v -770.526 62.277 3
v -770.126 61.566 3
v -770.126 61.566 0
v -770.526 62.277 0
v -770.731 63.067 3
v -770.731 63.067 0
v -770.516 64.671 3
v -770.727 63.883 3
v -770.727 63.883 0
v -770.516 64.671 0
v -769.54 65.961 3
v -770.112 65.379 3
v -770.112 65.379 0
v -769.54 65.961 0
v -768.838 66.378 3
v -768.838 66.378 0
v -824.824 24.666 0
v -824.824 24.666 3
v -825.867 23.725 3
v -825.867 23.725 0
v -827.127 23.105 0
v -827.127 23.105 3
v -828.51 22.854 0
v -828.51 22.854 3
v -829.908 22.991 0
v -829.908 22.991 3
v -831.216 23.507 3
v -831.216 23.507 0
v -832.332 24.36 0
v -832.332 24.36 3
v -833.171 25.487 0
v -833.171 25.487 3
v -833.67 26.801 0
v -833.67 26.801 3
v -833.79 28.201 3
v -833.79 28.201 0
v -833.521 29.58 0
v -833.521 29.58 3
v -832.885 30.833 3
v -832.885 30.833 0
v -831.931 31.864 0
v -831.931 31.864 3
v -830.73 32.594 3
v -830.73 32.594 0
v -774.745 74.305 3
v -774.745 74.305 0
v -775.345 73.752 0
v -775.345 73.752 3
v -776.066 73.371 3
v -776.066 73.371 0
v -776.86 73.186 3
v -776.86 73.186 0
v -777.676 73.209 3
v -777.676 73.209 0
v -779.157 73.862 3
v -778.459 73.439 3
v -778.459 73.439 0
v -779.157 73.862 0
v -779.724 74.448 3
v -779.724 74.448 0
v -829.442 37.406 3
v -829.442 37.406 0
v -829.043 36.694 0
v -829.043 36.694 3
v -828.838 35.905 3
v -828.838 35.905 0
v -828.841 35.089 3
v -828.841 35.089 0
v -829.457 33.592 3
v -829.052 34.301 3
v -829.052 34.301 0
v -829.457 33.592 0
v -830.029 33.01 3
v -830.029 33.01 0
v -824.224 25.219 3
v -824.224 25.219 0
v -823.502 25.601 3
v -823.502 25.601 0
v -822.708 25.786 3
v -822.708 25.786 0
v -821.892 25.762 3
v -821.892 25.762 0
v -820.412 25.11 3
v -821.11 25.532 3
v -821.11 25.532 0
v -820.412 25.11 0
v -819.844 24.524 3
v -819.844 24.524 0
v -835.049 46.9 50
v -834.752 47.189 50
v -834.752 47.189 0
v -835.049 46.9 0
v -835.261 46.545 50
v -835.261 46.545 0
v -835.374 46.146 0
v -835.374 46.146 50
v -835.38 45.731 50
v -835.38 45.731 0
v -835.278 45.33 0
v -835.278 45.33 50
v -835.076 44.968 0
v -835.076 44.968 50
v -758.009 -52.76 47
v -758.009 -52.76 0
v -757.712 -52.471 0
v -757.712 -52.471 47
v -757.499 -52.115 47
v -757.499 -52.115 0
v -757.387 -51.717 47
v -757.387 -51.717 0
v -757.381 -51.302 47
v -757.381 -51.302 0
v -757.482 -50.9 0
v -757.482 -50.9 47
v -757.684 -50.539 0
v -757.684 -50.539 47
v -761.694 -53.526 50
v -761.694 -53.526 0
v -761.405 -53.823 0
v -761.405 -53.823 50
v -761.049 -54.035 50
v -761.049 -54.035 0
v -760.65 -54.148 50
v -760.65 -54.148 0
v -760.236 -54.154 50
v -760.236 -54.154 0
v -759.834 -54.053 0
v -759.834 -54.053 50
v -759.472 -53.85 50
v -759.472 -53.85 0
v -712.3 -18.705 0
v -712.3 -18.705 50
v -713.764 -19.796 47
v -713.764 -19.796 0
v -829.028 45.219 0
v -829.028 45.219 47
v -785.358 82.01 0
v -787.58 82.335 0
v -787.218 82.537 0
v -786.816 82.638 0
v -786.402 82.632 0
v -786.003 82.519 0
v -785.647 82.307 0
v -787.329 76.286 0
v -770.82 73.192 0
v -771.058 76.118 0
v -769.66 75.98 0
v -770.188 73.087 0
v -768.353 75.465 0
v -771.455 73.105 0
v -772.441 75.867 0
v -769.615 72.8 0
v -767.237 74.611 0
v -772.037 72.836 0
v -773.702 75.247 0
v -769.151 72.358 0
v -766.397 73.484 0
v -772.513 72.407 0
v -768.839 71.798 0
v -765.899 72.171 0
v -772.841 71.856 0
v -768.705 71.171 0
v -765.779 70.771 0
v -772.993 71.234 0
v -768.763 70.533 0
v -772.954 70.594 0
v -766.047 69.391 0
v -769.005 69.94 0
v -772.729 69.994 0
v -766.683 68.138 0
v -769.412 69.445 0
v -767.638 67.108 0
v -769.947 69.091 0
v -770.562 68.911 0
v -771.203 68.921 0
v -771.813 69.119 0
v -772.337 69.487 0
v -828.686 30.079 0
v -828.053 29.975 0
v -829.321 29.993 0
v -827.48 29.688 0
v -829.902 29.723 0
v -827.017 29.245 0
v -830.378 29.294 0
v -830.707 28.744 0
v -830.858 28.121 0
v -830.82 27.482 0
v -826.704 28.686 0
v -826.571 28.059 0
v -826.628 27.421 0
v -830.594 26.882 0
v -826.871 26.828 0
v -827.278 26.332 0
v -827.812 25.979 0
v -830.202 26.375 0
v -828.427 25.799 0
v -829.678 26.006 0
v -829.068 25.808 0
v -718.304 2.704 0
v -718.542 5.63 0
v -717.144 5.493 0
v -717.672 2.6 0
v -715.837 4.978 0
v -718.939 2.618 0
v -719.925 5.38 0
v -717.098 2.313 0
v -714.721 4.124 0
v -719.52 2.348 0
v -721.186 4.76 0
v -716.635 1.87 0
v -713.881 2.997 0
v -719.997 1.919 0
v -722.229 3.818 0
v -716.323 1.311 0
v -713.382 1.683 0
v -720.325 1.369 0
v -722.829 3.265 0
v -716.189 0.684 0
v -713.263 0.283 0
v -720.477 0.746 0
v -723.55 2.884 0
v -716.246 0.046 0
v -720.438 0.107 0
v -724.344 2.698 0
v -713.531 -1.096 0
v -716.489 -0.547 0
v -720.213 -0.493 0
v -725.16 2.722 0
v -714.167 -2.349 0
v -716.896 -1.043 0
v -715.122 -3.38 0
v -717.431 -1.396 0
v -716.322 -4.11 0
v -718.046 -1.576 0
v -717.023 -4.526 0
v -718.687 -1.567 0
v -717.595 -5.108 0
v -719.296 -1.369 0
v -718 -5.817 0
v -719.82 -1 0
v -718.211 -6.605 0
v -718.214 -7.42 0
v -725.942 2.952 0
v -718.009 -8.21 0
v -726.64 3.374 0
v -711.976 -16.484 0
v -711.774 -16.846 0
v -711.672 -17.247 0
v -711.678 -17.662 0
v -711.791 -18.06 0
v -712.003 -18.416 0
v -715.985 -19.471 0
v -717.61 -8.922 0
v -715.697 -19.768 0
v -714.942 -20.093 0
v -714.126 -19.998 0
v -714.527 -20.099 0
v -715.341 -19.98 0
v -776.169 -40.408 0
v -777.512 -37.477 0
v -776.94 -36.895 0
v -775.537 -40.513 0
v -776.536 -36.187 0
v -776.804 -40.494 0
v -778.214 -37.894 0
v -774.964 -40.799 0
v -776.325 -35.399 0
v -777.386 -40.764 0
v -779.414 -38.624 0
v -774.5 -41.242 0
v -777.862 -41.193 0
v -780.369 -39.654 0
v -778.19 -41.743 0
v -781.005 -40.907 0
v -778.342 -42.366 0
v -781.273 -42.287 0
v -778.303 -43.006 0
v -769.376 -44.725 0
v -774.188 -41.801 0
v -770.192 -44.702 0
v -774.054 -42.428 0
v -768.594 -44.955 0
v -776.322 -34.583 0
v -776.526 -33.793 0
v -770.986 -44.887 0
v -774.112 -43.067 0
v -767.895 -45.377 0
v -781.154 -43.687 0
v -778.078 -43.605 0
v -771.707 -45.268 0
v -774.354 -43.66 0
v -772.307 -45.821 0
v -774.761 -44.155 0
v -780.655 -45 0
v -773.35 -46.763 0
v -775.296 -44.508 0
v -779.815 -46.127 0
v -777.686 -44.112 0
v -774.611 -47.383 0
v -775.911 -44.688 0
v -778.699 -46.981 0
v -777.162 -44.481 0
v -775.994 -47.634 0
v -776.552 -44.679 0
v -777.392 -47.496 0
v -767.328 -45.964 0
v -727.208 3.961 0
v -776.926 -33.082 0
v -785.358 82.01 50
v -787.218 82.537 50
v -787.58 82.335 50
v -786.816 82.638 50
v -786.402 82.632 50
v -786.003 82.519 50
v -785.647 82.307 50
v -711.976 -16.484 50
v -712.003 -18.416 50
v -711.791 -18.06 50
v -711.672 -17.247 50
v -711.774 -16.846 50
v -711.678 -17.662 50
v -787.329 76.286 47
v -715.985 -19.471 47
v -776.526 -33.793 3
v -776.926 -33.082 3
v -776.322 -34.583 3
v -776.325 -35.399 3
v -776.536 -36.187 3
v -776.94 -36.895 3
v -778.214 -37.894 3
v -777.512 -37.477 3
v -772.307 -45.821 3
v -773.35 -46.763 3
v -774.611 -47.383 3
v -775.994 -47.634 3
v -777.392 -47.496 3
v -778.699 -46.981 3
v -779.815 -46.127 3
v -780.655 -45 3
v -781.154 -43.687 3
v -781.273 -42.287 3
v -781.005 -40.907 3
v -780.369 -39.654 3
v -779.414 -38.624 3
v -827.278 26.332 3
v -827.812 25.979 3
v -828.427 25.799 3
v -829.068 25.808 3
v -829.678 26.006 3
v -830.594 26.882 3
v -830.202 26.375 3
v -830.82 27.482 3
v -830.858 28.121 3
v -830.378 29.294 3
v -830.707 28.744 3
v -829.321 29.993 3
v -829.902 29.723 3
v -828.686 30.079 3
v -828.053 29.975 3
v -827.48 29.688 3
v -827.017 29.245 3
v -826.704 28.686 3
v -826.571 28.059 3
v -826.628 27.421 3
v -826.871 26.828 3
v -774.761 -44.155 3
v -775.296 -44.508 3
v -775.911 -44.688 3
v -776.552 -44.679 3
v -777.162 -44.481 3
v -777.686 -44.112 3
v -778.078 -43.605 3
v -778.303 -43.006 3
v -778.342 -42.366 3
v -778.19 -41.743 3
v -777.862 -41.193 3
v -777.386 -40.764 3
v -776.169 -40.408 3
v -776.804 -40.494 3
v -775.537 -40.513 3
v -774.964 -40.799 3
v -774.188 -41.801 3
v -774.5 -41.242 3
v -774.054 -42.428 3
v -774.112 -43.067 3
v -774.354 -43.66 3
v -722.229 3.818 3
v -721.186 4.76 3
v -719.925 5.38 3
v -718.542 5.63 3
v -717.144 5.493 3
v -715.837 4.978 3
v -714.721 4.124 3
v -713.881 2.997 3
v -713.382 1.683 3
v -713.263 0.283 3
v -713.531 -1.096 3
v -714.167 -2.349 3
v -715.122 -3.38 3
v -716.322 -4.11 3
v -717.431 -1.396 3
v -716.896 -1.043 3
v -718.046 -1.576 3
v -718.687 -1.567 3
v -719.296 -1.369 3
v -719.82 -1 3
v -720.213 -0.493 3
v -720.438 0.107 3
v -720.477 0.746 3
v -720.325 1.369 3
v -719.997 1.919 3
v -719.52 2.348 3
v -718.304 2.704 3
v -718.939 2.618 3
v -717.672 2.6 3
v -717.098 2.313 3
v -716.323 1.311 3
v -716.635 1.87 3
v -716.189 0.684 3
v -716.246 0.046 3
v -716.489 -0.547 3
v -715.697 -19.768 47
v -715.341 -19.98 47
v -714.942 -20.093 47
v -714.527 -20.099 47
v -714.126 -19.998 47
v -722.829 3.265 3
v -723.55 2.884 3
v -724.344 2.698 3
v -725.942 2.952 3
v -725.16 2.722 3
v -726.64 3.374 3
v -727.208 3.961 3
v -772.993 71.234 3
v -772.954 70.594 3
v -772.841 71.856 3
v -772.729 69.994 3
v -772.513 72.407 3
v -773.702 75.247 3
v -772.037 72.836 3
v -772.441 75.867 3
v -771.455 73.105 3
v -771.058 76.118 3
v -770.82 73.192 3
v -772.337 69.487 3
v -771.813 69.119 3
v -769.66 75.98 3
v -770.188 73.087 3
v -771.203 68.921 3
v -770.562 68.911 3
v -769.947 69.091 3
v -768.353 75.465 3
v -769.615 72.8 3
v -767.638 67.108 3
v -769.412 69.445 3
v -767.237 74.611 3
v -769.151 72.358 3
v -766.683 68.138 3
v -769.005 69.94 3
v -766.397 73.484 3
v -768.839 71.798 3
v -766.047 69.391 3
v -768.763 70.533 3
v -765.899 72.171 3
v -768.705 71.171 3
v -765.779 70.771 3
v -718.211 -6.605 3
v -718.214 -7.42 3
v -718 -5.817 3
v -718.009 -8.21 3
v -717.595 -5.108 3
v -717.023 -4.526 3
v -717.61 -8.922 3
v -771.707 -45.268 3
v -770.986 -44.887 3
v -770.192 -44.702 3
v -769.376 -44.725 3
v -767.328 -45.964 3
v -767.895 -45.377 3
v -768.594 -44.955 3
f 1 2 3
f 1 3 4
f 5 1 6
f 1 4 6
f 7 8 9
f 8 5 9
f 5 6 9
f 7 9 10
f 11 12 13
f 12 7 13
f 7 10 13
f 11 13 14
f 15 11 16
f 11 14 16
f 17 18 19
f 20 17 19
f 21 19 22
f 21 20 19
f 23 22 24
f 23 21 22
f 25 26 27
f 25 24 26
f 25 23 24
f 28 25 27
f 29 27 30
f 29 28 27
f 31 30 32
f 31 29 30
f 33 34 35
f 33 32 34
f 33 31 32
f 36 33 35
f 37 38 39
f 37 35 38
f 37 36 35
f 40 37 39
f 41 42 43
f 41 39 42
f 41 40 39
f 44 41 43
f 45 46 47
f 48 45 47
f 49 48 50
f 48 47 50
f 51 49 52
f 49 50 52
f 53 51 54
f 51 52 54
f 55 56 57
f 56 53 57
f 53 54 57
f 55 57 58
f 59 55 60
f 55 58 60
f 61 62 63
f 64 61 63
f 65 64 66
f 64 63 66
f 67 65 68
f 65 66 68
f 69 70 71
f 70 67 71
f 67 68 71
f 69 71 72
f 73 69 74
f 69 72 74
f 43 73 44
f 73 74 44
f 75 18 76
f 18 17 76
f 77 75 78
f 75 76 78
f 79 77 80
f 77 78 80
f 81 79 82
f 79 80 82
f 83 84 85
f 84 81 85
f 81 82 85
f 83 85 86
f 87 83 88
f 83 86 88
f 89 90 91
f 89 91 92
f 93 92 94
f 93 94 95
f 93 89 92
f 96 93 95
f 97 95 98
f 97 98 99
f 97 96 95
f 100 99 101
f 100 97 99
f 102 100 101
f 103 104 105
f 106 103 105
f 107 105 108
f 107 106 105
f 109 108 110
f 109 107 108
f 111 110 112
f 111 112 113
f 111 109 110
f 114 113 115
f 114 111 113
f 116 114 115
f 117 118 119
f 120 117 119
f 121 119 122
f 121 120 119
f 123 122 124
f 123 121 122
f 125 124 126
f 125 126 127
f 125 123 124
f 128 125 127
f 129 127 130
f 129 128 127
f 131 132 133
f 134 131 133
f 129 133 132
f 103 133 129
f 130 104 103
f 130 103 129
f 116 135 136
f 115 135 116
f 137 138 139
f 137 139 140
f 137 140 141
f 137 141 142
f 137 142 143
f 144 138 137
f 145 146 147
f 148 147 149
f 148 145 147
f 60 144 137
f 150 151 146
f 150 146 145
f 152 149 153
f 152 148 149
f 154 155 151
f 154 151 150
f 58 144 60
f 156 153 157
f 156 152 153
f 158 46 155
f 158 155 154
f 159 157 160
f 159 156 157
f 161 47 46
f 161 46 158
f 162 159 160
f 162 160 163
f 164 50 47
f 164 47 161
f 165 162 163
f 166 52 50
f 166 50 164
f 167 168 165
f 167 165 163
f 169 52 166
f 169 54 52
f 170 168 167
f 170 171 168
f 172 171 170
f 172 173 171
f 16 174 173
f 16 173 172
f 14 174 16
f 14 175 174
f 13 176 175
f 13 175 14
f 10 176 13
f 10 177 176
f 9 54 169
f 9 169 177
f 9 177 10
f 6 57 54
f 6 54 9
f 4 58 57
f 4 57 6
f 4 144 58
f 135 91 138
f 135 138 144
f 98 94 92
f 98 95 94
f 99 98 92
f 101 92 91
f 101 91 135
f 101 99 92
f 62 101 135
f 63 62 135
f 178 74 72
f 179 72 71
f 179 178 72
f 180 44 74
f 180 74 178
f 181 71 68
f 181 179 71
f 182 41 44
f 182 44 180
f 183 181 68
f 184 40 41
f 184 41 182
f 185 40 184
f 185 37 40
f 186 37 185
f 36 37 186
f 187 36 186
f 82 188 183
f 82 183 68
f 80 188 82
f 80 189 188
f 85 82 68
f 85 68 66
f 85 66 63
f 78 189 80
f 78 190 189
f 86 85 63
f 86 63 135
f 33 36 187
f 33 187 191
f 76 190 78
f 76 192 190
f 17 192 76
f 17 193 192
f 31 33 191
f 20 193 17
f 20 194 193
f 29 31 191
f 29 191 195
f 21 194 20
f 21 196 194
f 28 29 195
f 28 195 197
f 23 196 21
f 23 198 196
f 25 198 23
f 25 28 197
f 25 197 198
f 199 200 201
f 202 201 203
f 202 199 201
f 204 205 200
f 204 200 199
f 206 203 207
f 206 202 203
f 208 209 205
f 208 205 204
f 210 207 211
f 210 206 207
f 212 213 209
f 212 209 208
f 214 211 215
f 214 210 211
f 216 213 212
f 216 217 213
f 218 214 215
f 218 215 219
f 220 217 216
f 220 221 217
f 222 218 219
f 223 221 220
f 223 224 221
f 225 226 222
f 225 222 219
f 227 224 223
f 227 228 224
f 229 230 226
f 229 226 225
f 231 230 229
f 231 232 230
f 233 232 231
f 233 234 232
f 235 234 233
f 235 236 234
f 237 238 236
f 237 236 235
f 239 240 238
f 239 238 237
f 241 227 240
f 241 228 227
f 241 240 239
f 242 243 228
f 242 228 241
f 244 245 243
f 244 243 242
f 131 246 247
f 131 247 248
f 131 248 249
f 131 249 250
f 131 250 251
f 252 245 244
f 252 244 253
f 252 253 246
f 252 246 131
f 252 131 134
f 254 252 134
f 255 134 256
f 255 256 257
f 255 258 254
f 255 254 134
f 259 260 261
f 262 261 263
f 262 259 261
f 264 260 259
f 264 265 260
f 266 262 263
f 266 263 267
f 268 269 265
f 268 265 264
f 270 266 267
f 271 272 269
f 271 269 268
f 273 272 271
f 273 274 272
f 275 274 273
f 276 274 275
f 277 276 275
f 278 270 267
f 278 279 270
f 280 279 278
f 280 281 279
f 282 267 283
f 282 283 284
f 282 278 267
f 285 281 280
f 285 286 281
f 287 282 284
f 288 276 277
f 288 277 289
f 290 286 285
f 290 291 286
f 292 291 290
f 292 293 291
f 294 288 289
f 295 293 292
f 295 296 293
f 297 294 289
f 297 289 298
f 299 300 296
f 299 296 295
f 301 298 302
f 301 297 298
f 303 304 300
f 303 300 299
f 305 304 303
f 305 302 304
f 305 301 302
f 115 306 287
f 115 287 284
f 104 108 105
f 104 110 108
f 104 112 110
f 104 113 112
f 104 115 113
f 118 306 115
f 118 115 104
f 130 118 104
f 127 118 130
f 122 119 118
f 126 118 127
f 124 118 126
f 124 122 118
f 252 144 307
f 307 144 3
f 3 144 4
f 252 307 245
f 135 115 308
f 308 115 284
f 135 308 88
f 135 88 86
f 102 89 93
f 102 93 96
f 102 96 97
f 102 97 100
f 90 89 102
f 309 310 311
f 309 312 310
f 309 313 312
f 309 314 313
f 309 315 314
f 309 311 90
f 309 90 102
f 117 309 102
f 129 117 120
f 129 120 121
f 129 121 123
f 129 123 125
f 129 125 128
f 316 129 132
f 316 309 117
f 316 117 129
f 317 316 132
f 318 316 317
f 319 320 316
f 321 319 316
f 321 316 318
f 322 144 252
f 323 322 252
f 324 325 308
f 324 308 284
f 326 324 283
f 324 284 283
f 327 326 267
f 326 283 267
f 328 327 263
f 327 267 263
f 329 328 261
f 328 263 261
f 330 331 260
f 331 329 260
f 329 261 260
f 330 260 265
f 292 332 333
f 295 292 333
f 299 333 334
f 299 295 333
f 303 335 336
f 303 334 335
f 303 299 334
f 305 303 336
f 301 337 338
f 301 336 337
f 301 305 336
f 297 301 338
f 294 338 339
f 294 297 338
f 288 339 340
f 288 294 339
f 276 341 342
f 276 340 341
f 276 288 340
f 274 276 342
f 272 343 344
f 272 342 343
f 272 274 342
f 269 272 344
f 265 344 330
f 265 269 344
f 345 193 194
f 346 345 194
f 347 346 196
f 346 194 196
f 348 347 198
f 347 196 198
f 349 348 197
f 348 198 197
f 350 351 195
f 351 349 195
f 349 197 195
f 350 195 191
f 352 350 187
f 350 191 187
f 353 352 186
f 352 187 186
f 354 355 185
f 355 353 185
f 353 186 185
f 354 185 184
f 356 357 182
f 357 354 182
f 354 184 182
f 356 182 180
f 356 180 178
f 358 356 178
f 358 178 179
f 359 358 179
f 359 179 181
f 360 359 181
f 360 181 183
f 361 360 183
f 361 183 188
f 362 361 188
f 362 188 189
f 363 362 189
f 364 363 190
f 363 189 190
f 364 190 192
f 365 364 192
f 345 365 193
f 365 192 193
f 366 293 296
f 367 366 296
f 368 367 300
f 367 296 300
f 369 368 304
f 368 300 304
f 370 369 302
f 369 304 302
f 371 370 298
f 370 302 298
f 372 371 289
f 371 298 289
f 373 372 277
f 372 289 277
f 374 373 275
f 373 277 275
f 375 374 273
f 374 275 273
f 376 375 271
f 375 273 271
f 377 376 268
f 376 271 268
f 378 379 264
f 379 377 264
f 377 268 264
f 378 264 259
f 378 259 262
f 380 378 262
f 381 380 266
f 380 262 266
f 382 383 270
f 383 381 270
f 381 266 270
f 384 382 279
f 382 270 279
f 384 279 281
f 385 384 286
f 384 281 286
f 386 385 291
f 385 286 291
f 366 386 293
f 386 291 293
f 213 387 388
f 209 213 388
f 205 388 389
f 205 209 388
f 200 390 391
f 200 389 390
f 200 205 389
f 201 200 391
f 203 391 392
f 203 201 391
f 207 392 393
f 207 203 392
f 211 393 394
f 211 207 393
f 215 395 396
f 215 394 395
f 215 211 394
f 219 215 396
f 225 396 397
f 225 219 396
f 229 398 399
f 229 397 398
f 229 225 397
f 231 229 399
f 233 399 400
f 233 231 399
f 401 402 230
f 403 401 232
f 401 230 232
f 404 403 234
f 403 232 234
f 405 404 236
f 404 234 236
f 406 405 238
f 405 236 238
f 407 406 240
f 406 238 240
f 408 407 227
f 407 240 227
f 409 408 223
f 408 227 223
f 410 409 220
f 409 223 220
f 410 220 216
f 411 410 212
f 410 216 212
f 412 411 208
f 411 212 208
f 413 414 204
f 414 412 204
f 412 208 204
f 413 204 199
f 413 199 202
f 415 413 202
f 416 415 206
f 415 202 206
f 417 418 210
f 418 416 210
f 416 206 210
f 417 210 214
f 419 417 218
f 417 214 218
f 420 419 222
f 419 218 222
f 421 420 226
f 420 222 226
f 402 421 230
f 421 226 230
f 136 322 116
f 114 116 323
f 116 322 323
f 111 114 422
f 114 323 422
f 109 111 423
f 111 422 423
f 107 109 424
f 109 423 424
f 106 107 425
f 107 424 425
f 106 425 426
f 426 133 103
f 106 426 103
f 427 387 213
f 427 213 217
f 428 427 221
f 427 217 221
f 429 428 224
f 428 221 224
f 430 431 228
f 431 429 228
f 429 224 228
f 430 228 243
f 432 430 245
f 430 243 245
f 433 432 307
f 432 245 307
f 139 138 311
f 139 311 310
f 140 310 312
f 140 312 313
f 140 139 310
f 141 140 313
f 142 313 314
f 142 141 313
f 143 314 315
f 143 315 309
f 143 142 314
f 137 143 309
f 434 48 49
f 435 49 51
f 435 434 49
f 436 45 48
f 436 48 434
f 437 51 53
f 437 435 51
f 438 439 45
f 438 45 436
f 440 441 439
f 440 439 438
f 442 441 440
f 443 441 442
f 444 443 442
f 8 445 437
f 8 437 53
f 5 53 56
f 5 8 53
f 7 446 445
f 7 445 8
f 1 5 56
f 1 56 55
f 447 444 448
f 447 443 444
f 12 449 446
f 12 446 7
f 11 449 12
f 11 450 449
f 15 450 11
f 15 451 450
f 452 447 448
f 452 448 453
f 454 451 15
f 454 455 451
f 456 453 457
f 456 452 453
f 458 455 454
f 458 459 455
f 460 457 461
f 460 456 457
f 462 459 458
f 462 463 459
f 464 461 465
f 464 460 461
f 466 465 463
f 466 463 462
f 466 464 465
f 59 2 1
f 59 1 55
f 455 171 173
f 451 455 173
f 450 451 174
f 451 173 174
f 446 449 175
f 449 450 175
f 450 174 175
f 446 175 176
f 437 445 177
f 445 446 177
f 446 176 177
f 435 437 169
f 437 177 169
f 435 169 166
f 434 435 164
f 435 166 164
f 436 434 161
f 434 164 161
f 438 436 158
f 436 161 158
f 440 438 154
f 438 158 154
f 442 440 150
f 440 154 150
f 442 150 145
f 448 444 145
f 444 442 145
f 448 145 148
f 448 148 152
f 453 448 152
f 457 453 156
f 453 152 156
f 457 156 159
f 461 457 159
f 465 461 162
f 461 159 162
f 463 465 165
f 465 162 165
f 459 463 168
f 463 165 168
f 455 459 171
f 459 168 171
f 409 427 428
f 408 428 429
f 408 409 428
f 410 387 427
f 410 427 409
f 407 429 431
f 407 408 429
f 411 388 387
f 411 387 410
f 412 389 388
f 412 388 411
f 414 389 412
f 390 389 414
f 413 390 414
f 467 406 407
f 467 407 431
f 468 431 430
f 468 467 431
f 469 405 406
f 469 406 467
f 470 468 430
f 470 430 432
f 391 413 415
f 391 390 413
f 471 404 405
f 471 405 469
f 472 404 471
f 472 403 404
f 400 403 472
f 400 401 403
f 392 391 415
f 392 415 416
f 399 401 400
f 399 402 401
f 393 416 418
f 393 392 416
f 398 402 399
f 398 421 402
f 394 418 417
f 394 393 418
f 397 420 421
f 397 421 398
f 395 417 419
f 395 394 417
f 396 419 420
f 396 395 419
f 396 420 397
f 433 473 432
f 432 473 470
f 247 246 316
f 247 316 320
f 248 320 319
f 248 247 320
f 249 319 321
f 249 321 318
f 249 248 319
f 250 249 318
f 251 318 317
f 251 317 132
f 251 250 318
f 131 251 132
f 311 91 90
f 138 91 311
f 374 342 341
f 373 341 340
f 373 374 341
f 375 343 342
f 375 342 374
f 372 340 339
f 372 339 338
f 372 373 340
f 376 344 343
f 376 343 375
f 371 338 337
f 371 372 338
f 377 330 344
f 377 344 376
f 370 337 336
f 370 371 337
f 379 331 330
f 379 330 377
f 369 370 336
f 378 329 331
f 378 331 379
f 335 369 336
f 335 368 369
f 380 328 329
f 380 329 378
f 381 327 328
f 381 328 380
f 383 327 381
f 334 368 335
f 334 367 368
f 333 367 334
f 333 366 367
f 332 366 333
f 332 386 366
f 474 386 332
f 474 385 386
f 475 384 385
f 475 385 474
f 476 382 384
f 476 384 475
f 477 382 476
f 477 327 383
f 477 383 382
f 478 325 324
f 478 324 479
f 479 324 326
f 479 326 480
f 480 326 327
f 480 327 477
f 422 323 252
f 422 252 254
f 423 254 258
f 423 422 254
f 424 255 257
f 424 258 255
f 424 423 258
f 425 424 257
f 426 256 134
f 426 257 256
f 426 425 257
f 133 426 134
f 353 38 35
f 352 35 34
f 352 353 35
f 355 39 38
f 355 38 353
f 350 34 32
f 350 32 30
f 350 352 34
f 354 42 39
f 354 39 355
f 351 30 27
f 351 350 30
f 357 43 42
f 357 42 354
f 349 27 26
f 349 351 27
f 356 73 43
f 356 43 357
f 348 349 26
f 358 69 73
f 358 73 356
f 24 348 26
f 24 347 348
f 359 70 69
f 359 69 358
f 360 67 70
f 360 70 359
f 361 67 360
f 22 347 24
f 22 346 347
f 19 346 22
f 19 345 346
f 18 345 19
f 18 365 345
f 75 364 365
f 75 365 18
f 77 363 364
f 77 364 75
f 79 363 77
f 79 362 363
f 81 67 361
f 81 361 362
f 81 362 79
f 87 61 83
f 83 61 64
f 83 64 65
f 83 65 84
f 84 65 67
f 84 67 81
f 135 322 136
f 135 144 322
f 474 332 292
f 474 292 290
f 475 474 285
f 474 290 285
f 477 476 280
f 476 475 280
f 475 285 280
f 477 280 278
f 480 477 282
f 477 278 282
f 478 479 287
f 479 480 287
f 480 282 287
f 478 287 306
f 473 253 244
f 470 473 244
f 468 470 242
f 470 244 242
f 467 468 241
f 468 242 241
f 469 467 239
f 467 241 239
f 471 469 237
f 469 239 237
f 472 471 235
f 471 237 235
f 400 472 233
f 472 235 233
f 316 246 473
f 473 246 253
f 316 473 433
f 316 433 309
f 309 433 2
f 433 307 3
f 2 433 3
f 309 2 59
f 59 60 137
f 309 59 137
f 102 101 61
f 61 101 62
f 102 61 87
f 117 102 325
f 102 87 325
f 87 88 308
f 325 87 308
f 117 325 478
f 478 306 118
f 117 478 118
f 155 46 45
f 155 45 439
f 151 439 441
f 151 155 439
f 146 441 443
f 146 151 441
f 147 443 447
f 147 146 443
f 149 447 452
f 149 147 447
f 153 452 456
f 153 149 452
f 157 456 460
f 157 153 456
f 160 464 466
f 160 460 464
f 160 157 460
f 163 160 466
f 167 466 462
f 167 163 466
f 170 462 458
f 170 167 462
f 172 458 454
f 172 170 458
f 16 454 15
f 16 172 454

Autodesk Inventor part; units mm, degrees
ref_plane "YZ Plane" through (0, 0, 0) normal (1, 0, 0) x (0, 1, 0)
ref_plane "XZ Plane" through (0, 0, 0) normal (0, 1, 0) x (-1, 0, 0)
ref_plane "XY Plane" through (0, 0, 0) normal (0, 0, 1) x (1, 0, 0)
ref_plane "Work Plane1" through (-774.147, 14.6804, 0) normal (0, 0, -1) x (0.5974542, -0.801903, 0)
sketch "Sketch1" plane through (-774.147, 14.6804, 0) normal (0, 0, -1) x (0.5974542, -0.801903, 0)
  line L0 (58.7225, -26.2361) -> (-57.2775, -26.2361)
  line L1 (-57.2775, -26.2361) -> (-57.2775, 25.7639)
  line L2 (-57.2775, 25.7639) -> (58.7225, 25.7639)
  line L3 (58.7225, 25.7639) -> (58.7225, -26.2361)
  arc A0 (19.6988, -21.7639) -> (2.3103, -21.7639) centre (11.0046, -62.2541) ccw construction
  arc A1 (19.6988, -21.7639) -> (24.3194, -21.7639) centre (22.0091, -11.0045) ccw construction
  arc A2 (41.7079, -21.7639) -> (24.3194, -21.7639) centre (33.0137, -62.2541) ccw construction
  arc A3 (41.7079, -21.7639) -> (54.7775, -8.6943) centre (44.0182, -11.0045) ccw construction
  arc A4 (54.7775, 8.6943) -> (54.7775, -8.6943) centre (95.2678, 0) ccw construction
  arc A5 (54.7775, 8.6943) -> (41.7079, 21.7639) centre (44.0182, 11.0046) ccw construction
  arc A6 (24.3194, 21.7639) -> (41.7079, 21.7639) centre (33.0137, 62.2541) ccw construction
  arc A7 (24.3194, 21.7639) -> (19.6988, 21.7639) centre (22.0091, 11.0046) ccw construction
  arc A8 (2.3103, 21.7639) -> (19.6988, 21.7639) centre (11.0046, 62.2541) ccw construction
  arc A9 (2.3103, 21.7639) -> (-2.3103, 21.7639) centre (0, 11.0046) ccw construction
  arc A10 (-19.6988, 21.7639) -> (-2.3103, 21.7639) centre (-11.0045, 62.2541) ccw construction
  arc A11 (-19.6988, 21.7639) -> (-24.3194, 21.7639) centre (-22.0091, 11.0046) ccw construction
  arc A12 (-41.7079, 21.7639) -> (-24.3194, 21.7639) centre (-33.0136, 62.2541) ccw construction
  arc A13 (-41.7079, 21.7639) -> (-54.7775, 8.6943) centre (-44.0182, 11.0046) ccw construction
  arc A14 (-54.7775, -8.6943) -> (-54.7775, 8.6943) centre (-95.2678, 0) ccw construction
  arc A15 (-54.7775, -8.6943) -> (-41.7079, -21.7639) centre (-44.0182, -11.0045) ccw construction
  arc A16 (-24.3194, -21.7639) -> (-41.7079, -21.7639) centre (-33.0136, -62.2541) ccw construction
  arc A17 (-24.3194, -21.7639) -> (-19.6988, -21.7639) centre (-22.0091, -11.0045) ccw construction
  arc A18 (-2.3103, -21.7639) -> (-19.6988, -21.7639) centre (-11.0045, -62.2541) ccw construction
  arc A19 (-2.3103, -21.7639) -> (2.3103, -21.7639) centre (0, -11.0045) ccw construction
  line L4 (159.874, 0.748) -> (161.144, 0.748) construction
  line L5 (161.144, 0.748) -> (161.144, -3.697) construction
  line L6 (159.874, -3.697) -> (161.144, -3.697) construction
  line L7 (159.874, -3.697) -> (159.874, 0.748) construction
  line L8 (63.7225, -31.2361) -> (-62.2775, -31.2361)
  line L9 (-62.2775, -31.2361) -> (-62.2775, 30.7639)
  line L10 (-62.2775, 30.7639) -> (63.7225, 30.7639)
  line L11 (63.7225, 30.7639) -> (63.7225, -31.2361)
  line L12 (58.7225, -26.2361) -> (63.7225, -26.2361)
  line L13 (-57.2775, -26.2361) -> (-62.2775, -26.2361)
  line L14 (-57.2775, 25.7639) -> (-62.2775, 25.7639)
  line L15 (58.7225, 25.7639) -> (63.7225, 25.7639)
  point P0 (474.2897, -612.02)
  dimension "d0" = 116
  dimension "d1" = 52
  dimension "d2" = 2.5
  dimension "d3" = 4
  dimension "d4" = 5
extrude "Extrusion1" add sketch "Sketch1" against normal blind 47 contours L12 L11 L8 L9 L13 L0 | L13 L9 L14 L1 | L2 L14 L9 L10 L11 L15
sketch "Sketch2" plane through (-774.147, 14.6804, 47) normal (0, 0, 1) x (0.5974542, -0.801903, 0)
  line L0 (-62.2775, -30.7639) -> (63.7225, -30.7639) projected
  line L1 (63.7225, 31.2361) -> (-62.2775, 31.2361) projected
  line L2 (63.7225, -30.7639) -> (-62.2775, -30.7639)
  line L3 (-62.2775, -30.7639) -> (-62.2775, 31.2361)
  line L4 (-62.2775, 31.2361) -> (63.7225, 31.2361)
  line L5 (63.7225, 31.2361) -> (63.7225, -30.7639)
  point P0 (474.2897, 612.02)
  point P1 (-62.2775, -30.7639)
  point P2 (63.7225, 31.2361)
extrude "Extrusion2" add sketch "Sketch2" along normal blind 3
fillet "Fillet1" radius 1.5875 6 edges at (-711.0274, -17.7567, 25) (-786.3067, 83.283, 25) (-760.7454, -54.7989, 25) (-756.7359, -51.8116, 23.5) (-715.037, -20.744, 23.5) (-836.0247, 46.2409, 25)
ref_plane "Work Plane2" through (-841.5049, -36.3773, 0) normal (0, 0, 1) x (0.6694225, -0.7428819, 0)
sketch "Sketch3" plane through (-841.5049, -36.3773, 0) normal (0, 0, 1) x (0.6694225, -0.7428819, 0)
  line L0 (-50.362, 120.9615) -> (71.931, 109.5419) projected
  line L1 (66.1667, 47.8105) -> (-56.1263, 59.23) projected
  line L2 (73.3641, 107.8137) -> (73.1944, 105.9966) projected
  line L3 (-57.5594, 60.9582) -> (-52.0902, 119.5284) projected
  circle A0 centre (-39.2118, 52.5485) radius 2.15
  circle A1 centre (48.3075, 44.3761) radius 2.15
  line L4 (68.0646, 51.0606) -> (67.8949, 49.2435) projected
  arc A2 (-44.0243, 54.1752) -> (-34.1813, 53.2561) centre (-39.2118, 52.5485) ccw
  line L5 (40.7824, 50.1808) -> (48.7798, 49.434)
  arc A3 (-44.0243, 54.1752) -> (-46.7369, 58.3532) centre (-47.0321, 55.192) ccw
  arc A4 (-30.7421, 56.8597) -> (-34.1813, 53.2561) centre (-31.0373, 53.6984) ccw
  arc A5 (43.495, 46.0028) -> (53.338, 45.0837) centre (48.3075, 44.3761) ccw
  arc A6 (43.495, 46.0028) -> (40.7824, 50.1808) centre (40.4872, 47.0196) ccw
  arc A7 (43.495, 46.0028) -> (40.7824, 50.1808) centre (40.4872, 47.0196) ccw
  line L6 (66.1667, 47.8105) -> (40.7824, 50.1808)
  arc A8 (43.495, 46.0028) -> (40.7824, 50.1808) centre (40.4872, 47.0196) ccw
  line L7 (48.3075, 44.3761) -> (48.6282, 47.8105)
  arc A9 (56.7772, 48.6873) -> (53.338, 45.0837) centre (56.482, 45.526) ccw
  line L8 (-54.8248, 90.2433) -> (-8.2036, 85.8899) construction
  line L9 (71.931, 109.5419) -> (-50.362, 120.9615)
  circle A10 centre (-32.5028, 124.3959) radius 2.15
  circle A11 centre (55.0165, 116.2235) radius 2.15
  line L10 (73.1944, 105.9966) -> (73.3641, 107.8137)
  arc A12 (-27.6903, 122.7691) -> (-37.5332, 123.6882) centre (-32.5028, 124.3959) ccw
  line L11 (46.5468, 111.9123) -> (54.5442, 111.1655)
  arc A13 (-40.9725, 120.0847) -> (-37.5332, 123.6882) centre (-40.6773, 123.2459) ccw
  arc A14 (-27.6903, 122.7691) -> (-24.9777, 118.5911) centre (-24.6825, 121.7524) ccw
  arc A15 (59.829, 114.5967) -> (49.986, 115.5158) centre (55.0165, 116.2235) ccw
  arc A16 (46.5468, 111.9123) -> (49.986, 115.5158) centre (46.842, 115.0735) ccw
  arc A17 (46.5468, 111.9123) -> (49.986, 115.5158) centre (46.842, 115.0735) ccw
  line L12 (71.931, 109.5419) -> (46.5468, 111.9123)
  arc A18 (46.5468, 111.9123) -> (49.986, 115.5158) centre (46.842, 115.0735) ccw
  line L13 (55.0165, 116.2235) -> (54.6958, 112.7891)
  arc A19 (59.829, 114.5967) -> (62.5416, 110.4187) centre (62.8368, 113.58) ccw
  point P0 (536.2982, 649.4905)
  point P1 (73.2792, 106.9052)
  point P2 (48.7798, 49.434)
  point P3 (54.5442, 111.1655)
  point P4 (-40.9725, 120.0847)
  point P5 (-24.9777, 118.5911)
  point P6 (49.986, 115.5158)
  point P7 (46.5468, 111.9123)
  point P8 (62.5416, 110.4187)
  point P9 (43.495, 46.0028)
  point P10 (56.7772, 48.6873)
  point P11 (40.7824, 50.1808)
  point P12 (-30.7421, 56.8597)
  point P13 (-46.7369, 58.3532)
  dimension "d16" = 4.3
  dimension "d18" = 4.3
  dimension "d20" = 19.05
  dimension "d21" = 19.05
  dimension "d24" = 5.08
  dimension "d25" = 3.175
  dimension "d26" = 3.175
  dimension "d27" = 3.175
  dimension "d28" = 5.08
  dimension "d29" = 3.175
  dimension "d30" = 3.175
extrude "Extrusion3" add sketch "Sketch3" along normal blind 3
properties part number "Battery_Holder"
